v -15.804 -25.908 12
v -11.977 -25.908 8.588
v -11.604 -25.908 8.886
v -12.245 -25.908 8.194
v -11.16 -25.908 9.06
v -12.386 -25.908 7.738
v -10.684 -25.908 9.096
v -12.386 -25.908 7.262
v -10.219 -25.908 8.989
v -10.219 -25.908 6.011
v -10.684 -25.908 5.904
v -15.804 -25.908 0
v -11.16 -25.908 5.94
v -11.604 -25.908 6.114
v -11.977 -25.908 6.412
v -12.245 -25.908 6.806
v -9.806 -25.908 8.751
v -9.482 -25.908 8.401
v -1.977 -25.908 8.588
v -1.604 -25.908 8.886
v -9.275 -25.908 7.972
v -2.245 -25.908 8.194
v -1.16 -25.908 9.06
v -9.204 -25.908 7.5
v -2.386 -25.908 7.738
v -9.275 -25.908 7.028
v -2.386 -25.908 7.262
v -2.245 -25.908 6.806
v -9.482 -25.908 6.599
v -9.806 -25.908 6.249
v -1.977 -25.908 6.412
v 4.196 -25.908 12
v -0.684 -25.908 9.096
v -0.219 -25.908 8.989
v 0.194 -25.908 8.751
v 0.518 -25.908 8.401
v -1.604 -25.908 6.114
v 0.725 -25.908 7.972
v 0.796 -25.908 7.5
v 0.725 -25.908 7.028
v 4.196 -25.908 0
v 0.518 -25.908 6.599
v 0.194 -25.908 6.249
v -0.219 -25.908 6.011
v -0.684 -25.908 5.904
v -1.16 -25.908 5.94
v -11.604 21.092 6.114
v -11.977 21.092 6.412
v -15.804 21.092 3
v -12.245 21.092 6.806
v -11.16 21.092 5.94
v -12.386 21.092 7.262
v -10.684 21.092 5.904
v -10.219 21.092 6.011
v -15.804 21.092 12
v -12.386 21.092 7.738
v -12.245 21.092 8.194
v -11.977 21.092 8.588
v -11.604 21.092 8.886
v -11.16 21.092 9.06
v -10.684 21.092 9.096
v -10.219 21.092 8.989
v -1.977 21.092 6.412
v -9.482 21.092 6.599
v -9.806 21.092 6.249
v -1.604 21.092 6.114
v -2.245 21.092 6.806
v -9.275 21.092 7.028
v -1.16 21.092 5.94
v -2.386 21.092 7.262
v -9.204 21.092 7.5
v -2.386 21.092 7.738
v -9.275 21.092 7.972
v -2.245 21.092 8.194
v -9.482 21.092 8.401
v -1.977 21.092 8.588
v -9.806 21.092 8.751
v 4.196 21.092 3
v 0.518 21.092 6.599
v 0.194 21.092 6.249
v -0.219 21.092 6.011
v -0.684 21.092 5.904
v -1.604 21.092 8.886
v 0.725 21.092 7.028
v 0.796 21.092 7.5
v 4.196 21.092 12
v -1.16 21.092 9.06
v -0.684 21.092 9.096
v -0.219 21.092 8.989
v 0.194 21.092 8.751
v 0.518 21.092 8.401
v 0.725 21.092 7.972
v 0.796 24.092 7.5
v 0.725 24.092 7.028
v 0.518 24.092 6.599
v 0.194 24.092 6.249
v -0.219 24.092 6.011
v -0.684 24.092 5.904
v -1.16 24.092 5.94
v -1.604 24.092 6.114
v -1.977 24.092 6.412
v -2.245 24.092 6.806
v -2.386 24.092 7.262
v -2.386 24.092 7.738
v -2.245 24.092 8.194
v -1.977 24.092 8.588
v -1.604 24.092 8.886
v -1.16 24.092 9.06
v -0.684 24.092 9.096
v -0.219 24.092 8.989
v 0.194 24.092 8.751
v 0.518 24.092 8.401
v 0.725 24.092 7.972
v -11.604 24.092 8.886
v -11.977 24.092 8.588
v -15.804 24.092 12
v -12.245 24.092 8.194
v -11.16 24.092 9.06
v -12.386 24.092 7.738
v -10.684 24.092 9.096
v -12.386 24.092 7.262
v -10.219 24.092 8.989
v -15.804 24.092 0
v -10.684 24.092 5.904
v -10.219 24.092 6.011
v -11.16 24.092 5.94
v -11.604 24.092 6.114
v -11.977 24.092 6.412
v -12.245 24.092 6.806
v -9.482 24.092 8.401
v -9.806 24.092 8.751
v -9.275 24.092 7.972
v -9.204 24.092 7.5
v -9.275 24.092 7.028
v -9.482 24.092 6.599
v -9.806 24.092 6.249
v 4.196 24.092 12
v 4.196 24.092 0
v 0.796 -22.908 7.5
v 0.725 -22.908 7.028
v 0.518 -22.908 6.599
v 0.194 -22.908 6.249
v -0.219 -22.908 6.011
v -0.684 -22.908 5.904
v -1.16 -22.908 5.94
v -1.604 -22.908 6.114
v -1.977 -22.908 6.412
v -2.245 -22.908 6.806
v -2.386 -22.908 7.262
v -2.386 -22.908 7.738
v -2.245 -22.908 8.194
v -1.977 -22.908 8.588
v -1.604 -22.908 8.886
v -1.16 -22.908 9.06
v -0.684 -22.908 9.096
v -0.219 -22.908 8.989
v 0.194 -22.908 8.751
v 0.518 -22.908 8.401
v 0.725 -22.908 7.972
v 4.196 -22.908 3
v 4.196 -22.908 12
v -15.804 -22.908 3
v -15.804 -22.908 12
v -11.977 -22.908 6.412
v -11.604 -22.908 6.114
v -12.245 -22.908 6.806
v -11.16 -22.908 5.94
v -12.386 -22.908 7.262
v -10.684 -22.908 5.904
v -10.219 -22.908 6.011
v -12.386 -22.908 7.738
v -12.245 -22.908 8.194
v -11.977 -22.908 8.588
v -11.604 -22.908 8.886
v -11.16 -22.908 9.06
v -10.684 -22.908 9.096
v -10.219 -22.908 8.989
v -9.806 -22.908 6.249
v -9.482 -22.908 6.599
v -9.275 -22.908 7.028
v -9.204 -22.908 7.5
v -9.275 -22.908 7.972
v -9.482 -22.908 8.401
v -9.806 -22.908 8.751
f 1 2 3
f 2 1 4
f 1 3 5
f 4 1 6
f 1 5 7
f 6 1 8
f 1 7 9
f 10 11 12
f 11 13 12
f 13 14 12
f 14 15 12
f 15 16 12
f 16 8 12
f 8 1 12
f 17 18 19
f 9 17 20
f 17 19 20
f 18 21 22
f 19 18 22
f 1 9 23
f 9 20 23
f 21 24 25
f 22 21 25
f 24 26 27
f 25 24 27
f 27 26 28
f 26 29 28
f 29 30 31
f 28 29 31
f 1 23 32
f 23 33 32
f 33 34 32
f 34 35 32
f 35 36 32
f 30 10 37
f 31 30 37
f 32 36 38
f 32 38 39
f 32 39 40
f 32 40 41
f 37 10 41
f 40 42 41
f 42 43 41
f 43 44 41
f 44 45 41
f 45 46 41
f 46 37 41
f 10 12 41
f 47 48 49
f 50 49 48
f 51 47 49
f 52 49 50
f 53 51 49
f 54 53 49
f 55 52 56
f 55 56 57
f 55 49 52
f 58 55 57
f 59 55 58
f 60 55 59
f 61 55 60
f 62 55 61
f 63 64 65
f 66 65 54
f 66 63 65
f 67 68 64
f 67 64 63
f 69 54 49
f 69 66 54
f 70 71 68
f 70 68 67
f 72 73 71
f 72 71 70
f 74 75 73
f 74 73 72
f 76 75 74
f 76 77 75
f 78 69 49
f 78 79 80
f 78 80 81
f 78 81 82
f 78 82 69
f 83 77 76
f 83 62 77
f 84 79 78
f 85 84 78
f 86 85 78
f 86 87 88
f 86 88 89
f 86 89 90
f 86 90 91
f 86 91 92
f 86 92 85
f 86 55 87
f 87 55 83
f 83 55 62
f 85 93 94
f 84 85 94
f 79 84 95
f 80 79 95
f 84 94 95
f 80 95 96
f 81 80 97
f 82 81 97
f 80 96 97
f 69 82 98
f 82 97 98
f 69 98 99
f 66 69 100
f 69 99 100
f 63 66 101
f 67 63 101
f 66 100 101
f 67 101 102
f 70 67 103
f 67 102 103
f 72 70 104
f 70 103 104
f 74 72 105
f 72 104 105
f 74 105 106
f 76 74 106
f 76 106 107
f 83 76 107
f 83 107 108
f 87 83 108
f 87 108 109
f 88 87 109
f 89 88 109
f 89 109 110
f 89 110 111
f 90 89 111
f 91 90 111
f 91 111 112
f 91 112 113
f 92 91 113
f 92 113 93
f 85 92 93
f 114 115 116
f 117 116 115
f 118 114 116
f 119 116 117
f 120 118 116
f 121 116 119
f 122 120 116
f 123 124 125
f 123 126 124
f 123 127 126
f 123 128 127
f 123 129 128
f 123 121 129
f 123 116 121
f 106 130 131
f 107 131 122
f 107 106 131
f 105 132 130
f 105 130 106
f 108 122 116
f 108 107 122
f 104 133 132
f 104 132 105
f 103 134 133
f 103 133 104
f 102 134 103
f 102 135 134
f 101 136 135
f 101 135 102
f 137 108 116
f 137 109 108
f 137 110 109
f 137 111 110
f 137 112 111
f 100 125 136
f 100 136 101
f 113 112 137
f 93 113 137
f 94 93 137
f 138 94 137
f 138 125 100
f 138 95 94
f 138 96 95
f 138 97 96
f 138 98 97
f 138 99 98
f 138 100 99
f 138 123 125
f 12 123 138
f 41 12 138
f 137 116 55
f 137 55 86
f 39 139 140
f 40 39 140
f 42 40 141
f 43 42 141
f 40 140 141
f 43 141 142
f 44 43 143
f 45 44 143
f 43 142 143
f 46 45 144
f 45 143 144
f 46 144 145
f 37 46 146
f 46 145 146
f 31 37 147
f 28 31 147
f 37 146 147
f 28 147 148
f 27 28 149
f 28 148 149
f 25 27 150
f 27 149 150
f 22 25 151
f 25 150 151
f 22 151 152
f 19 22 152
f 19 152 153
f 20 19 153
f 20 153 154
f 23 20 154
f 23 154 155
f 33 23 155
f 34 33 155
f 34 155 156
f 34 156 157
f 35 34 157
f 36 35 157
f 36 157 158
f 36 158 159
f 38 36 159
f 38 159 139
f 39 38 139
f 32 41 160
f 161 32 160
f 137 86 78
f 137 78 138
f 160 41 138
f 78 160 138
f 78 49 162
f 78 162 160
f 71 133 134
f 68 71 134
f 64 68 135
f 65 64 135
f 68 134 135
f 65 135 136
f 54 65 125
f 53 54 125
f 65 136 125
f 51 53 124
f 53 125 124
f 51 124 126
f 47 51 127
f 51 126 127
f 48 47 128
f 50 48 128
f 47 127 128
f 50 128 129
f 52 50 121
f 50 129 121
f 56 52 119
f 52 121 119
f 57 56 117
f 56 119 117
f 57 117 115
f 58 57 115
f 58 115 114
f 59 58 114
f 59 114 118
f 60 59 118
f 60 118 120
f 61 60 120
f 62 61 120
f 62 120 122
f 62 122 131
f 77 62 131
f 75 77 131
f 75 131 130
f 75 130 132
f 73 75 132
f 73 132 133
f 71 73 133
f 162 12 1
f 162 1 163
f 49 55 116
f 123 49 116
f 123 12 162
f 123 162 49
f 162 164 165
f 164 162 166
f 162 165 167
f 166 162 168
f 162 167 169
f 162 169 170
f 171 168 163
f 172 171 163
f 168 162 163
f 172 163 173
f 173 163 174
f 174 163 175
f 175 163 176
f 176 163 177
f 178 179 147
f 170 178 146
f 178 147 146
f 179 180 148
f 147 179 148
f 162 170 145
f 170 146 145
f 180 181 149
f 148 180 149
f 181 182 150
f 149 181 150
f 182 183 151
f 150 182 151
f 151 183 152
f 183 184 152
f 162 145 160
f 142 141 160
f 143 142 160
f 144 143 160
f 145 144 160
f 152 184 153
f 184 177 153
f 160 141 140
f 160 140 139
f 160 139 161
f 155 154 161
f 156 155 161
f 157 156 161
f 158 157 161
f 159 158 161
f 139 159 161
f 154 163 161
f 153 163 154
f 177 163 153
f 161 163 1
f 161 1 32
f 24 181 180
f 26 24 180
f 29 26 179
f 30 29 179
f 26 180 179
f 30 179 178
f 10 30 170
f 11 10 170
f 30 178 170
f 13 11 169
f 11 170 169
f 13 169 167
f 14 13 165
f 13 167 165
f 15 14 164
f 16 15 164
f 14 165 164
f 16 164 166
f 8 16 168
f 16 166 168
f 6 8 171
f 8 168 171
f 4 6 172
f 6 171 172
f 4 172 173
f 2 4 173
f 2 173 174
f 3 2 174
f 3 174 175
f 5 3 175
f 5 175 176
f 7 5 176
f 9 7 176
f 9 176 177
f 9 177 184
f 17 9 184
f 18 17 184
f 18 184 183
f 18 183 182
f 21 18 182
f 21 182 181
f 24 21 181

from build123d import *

# Parameters (mm, degrees)
SKETCH_1_W          = 20
SKETCH_1_H          = 50
EXTRUDE_1_DEPTH     = 12
SKETCH_2_W          = 20
SKETCH_2_H          = 44
CUT_EXTRUDE_1_DEPTH = 9
SKETCH_3_R          = 1.6
CUT_EXTRUDE_2_DEPTH = 51


with BuildPart() as part:
    # 草图1 → 凸台-拉伸1 (new body)
    with BuildSketch(Plane.XY):
        with Locations((-5.803858521, -0.908360129)):
            Rectangle(SKETCH_1_W, SKETCH_1_H)
    extrude(amount=EXTRUDE_1_DEPTH)

    # 草图2 → 切除-拉伸1 (cut)
    with BuildSketch(Plane.XY.offset(12)):
        with Locations((-5.803858521, -0.908360129)):
            Rectangle(SKETCH_2_W, SKETCH_2_H)
    extrude(amount=-CUT_EXTRUDE_1_DEPTH, mode=Mode.SUBTRACT)

    # 草图3 → 切除-拉伸2 (cut, through all)
    with BuildSketch(Plane(origin=(0, 24.091639871, 0), x_dir=(1, 0, 0), z_dir=(0, 1, 0))):
        with Locations((-10.803858521, -7.5)):
            Circle(SKETCH_3_R)
        with Locations((-0.803858521, -7.5)):
            Circle(SKETCH_3_R)
    extrude(amount=-CUT_EXTRUDE_2_DEPTH, mode=Mode.SUBTRACT)


solid = part.part
